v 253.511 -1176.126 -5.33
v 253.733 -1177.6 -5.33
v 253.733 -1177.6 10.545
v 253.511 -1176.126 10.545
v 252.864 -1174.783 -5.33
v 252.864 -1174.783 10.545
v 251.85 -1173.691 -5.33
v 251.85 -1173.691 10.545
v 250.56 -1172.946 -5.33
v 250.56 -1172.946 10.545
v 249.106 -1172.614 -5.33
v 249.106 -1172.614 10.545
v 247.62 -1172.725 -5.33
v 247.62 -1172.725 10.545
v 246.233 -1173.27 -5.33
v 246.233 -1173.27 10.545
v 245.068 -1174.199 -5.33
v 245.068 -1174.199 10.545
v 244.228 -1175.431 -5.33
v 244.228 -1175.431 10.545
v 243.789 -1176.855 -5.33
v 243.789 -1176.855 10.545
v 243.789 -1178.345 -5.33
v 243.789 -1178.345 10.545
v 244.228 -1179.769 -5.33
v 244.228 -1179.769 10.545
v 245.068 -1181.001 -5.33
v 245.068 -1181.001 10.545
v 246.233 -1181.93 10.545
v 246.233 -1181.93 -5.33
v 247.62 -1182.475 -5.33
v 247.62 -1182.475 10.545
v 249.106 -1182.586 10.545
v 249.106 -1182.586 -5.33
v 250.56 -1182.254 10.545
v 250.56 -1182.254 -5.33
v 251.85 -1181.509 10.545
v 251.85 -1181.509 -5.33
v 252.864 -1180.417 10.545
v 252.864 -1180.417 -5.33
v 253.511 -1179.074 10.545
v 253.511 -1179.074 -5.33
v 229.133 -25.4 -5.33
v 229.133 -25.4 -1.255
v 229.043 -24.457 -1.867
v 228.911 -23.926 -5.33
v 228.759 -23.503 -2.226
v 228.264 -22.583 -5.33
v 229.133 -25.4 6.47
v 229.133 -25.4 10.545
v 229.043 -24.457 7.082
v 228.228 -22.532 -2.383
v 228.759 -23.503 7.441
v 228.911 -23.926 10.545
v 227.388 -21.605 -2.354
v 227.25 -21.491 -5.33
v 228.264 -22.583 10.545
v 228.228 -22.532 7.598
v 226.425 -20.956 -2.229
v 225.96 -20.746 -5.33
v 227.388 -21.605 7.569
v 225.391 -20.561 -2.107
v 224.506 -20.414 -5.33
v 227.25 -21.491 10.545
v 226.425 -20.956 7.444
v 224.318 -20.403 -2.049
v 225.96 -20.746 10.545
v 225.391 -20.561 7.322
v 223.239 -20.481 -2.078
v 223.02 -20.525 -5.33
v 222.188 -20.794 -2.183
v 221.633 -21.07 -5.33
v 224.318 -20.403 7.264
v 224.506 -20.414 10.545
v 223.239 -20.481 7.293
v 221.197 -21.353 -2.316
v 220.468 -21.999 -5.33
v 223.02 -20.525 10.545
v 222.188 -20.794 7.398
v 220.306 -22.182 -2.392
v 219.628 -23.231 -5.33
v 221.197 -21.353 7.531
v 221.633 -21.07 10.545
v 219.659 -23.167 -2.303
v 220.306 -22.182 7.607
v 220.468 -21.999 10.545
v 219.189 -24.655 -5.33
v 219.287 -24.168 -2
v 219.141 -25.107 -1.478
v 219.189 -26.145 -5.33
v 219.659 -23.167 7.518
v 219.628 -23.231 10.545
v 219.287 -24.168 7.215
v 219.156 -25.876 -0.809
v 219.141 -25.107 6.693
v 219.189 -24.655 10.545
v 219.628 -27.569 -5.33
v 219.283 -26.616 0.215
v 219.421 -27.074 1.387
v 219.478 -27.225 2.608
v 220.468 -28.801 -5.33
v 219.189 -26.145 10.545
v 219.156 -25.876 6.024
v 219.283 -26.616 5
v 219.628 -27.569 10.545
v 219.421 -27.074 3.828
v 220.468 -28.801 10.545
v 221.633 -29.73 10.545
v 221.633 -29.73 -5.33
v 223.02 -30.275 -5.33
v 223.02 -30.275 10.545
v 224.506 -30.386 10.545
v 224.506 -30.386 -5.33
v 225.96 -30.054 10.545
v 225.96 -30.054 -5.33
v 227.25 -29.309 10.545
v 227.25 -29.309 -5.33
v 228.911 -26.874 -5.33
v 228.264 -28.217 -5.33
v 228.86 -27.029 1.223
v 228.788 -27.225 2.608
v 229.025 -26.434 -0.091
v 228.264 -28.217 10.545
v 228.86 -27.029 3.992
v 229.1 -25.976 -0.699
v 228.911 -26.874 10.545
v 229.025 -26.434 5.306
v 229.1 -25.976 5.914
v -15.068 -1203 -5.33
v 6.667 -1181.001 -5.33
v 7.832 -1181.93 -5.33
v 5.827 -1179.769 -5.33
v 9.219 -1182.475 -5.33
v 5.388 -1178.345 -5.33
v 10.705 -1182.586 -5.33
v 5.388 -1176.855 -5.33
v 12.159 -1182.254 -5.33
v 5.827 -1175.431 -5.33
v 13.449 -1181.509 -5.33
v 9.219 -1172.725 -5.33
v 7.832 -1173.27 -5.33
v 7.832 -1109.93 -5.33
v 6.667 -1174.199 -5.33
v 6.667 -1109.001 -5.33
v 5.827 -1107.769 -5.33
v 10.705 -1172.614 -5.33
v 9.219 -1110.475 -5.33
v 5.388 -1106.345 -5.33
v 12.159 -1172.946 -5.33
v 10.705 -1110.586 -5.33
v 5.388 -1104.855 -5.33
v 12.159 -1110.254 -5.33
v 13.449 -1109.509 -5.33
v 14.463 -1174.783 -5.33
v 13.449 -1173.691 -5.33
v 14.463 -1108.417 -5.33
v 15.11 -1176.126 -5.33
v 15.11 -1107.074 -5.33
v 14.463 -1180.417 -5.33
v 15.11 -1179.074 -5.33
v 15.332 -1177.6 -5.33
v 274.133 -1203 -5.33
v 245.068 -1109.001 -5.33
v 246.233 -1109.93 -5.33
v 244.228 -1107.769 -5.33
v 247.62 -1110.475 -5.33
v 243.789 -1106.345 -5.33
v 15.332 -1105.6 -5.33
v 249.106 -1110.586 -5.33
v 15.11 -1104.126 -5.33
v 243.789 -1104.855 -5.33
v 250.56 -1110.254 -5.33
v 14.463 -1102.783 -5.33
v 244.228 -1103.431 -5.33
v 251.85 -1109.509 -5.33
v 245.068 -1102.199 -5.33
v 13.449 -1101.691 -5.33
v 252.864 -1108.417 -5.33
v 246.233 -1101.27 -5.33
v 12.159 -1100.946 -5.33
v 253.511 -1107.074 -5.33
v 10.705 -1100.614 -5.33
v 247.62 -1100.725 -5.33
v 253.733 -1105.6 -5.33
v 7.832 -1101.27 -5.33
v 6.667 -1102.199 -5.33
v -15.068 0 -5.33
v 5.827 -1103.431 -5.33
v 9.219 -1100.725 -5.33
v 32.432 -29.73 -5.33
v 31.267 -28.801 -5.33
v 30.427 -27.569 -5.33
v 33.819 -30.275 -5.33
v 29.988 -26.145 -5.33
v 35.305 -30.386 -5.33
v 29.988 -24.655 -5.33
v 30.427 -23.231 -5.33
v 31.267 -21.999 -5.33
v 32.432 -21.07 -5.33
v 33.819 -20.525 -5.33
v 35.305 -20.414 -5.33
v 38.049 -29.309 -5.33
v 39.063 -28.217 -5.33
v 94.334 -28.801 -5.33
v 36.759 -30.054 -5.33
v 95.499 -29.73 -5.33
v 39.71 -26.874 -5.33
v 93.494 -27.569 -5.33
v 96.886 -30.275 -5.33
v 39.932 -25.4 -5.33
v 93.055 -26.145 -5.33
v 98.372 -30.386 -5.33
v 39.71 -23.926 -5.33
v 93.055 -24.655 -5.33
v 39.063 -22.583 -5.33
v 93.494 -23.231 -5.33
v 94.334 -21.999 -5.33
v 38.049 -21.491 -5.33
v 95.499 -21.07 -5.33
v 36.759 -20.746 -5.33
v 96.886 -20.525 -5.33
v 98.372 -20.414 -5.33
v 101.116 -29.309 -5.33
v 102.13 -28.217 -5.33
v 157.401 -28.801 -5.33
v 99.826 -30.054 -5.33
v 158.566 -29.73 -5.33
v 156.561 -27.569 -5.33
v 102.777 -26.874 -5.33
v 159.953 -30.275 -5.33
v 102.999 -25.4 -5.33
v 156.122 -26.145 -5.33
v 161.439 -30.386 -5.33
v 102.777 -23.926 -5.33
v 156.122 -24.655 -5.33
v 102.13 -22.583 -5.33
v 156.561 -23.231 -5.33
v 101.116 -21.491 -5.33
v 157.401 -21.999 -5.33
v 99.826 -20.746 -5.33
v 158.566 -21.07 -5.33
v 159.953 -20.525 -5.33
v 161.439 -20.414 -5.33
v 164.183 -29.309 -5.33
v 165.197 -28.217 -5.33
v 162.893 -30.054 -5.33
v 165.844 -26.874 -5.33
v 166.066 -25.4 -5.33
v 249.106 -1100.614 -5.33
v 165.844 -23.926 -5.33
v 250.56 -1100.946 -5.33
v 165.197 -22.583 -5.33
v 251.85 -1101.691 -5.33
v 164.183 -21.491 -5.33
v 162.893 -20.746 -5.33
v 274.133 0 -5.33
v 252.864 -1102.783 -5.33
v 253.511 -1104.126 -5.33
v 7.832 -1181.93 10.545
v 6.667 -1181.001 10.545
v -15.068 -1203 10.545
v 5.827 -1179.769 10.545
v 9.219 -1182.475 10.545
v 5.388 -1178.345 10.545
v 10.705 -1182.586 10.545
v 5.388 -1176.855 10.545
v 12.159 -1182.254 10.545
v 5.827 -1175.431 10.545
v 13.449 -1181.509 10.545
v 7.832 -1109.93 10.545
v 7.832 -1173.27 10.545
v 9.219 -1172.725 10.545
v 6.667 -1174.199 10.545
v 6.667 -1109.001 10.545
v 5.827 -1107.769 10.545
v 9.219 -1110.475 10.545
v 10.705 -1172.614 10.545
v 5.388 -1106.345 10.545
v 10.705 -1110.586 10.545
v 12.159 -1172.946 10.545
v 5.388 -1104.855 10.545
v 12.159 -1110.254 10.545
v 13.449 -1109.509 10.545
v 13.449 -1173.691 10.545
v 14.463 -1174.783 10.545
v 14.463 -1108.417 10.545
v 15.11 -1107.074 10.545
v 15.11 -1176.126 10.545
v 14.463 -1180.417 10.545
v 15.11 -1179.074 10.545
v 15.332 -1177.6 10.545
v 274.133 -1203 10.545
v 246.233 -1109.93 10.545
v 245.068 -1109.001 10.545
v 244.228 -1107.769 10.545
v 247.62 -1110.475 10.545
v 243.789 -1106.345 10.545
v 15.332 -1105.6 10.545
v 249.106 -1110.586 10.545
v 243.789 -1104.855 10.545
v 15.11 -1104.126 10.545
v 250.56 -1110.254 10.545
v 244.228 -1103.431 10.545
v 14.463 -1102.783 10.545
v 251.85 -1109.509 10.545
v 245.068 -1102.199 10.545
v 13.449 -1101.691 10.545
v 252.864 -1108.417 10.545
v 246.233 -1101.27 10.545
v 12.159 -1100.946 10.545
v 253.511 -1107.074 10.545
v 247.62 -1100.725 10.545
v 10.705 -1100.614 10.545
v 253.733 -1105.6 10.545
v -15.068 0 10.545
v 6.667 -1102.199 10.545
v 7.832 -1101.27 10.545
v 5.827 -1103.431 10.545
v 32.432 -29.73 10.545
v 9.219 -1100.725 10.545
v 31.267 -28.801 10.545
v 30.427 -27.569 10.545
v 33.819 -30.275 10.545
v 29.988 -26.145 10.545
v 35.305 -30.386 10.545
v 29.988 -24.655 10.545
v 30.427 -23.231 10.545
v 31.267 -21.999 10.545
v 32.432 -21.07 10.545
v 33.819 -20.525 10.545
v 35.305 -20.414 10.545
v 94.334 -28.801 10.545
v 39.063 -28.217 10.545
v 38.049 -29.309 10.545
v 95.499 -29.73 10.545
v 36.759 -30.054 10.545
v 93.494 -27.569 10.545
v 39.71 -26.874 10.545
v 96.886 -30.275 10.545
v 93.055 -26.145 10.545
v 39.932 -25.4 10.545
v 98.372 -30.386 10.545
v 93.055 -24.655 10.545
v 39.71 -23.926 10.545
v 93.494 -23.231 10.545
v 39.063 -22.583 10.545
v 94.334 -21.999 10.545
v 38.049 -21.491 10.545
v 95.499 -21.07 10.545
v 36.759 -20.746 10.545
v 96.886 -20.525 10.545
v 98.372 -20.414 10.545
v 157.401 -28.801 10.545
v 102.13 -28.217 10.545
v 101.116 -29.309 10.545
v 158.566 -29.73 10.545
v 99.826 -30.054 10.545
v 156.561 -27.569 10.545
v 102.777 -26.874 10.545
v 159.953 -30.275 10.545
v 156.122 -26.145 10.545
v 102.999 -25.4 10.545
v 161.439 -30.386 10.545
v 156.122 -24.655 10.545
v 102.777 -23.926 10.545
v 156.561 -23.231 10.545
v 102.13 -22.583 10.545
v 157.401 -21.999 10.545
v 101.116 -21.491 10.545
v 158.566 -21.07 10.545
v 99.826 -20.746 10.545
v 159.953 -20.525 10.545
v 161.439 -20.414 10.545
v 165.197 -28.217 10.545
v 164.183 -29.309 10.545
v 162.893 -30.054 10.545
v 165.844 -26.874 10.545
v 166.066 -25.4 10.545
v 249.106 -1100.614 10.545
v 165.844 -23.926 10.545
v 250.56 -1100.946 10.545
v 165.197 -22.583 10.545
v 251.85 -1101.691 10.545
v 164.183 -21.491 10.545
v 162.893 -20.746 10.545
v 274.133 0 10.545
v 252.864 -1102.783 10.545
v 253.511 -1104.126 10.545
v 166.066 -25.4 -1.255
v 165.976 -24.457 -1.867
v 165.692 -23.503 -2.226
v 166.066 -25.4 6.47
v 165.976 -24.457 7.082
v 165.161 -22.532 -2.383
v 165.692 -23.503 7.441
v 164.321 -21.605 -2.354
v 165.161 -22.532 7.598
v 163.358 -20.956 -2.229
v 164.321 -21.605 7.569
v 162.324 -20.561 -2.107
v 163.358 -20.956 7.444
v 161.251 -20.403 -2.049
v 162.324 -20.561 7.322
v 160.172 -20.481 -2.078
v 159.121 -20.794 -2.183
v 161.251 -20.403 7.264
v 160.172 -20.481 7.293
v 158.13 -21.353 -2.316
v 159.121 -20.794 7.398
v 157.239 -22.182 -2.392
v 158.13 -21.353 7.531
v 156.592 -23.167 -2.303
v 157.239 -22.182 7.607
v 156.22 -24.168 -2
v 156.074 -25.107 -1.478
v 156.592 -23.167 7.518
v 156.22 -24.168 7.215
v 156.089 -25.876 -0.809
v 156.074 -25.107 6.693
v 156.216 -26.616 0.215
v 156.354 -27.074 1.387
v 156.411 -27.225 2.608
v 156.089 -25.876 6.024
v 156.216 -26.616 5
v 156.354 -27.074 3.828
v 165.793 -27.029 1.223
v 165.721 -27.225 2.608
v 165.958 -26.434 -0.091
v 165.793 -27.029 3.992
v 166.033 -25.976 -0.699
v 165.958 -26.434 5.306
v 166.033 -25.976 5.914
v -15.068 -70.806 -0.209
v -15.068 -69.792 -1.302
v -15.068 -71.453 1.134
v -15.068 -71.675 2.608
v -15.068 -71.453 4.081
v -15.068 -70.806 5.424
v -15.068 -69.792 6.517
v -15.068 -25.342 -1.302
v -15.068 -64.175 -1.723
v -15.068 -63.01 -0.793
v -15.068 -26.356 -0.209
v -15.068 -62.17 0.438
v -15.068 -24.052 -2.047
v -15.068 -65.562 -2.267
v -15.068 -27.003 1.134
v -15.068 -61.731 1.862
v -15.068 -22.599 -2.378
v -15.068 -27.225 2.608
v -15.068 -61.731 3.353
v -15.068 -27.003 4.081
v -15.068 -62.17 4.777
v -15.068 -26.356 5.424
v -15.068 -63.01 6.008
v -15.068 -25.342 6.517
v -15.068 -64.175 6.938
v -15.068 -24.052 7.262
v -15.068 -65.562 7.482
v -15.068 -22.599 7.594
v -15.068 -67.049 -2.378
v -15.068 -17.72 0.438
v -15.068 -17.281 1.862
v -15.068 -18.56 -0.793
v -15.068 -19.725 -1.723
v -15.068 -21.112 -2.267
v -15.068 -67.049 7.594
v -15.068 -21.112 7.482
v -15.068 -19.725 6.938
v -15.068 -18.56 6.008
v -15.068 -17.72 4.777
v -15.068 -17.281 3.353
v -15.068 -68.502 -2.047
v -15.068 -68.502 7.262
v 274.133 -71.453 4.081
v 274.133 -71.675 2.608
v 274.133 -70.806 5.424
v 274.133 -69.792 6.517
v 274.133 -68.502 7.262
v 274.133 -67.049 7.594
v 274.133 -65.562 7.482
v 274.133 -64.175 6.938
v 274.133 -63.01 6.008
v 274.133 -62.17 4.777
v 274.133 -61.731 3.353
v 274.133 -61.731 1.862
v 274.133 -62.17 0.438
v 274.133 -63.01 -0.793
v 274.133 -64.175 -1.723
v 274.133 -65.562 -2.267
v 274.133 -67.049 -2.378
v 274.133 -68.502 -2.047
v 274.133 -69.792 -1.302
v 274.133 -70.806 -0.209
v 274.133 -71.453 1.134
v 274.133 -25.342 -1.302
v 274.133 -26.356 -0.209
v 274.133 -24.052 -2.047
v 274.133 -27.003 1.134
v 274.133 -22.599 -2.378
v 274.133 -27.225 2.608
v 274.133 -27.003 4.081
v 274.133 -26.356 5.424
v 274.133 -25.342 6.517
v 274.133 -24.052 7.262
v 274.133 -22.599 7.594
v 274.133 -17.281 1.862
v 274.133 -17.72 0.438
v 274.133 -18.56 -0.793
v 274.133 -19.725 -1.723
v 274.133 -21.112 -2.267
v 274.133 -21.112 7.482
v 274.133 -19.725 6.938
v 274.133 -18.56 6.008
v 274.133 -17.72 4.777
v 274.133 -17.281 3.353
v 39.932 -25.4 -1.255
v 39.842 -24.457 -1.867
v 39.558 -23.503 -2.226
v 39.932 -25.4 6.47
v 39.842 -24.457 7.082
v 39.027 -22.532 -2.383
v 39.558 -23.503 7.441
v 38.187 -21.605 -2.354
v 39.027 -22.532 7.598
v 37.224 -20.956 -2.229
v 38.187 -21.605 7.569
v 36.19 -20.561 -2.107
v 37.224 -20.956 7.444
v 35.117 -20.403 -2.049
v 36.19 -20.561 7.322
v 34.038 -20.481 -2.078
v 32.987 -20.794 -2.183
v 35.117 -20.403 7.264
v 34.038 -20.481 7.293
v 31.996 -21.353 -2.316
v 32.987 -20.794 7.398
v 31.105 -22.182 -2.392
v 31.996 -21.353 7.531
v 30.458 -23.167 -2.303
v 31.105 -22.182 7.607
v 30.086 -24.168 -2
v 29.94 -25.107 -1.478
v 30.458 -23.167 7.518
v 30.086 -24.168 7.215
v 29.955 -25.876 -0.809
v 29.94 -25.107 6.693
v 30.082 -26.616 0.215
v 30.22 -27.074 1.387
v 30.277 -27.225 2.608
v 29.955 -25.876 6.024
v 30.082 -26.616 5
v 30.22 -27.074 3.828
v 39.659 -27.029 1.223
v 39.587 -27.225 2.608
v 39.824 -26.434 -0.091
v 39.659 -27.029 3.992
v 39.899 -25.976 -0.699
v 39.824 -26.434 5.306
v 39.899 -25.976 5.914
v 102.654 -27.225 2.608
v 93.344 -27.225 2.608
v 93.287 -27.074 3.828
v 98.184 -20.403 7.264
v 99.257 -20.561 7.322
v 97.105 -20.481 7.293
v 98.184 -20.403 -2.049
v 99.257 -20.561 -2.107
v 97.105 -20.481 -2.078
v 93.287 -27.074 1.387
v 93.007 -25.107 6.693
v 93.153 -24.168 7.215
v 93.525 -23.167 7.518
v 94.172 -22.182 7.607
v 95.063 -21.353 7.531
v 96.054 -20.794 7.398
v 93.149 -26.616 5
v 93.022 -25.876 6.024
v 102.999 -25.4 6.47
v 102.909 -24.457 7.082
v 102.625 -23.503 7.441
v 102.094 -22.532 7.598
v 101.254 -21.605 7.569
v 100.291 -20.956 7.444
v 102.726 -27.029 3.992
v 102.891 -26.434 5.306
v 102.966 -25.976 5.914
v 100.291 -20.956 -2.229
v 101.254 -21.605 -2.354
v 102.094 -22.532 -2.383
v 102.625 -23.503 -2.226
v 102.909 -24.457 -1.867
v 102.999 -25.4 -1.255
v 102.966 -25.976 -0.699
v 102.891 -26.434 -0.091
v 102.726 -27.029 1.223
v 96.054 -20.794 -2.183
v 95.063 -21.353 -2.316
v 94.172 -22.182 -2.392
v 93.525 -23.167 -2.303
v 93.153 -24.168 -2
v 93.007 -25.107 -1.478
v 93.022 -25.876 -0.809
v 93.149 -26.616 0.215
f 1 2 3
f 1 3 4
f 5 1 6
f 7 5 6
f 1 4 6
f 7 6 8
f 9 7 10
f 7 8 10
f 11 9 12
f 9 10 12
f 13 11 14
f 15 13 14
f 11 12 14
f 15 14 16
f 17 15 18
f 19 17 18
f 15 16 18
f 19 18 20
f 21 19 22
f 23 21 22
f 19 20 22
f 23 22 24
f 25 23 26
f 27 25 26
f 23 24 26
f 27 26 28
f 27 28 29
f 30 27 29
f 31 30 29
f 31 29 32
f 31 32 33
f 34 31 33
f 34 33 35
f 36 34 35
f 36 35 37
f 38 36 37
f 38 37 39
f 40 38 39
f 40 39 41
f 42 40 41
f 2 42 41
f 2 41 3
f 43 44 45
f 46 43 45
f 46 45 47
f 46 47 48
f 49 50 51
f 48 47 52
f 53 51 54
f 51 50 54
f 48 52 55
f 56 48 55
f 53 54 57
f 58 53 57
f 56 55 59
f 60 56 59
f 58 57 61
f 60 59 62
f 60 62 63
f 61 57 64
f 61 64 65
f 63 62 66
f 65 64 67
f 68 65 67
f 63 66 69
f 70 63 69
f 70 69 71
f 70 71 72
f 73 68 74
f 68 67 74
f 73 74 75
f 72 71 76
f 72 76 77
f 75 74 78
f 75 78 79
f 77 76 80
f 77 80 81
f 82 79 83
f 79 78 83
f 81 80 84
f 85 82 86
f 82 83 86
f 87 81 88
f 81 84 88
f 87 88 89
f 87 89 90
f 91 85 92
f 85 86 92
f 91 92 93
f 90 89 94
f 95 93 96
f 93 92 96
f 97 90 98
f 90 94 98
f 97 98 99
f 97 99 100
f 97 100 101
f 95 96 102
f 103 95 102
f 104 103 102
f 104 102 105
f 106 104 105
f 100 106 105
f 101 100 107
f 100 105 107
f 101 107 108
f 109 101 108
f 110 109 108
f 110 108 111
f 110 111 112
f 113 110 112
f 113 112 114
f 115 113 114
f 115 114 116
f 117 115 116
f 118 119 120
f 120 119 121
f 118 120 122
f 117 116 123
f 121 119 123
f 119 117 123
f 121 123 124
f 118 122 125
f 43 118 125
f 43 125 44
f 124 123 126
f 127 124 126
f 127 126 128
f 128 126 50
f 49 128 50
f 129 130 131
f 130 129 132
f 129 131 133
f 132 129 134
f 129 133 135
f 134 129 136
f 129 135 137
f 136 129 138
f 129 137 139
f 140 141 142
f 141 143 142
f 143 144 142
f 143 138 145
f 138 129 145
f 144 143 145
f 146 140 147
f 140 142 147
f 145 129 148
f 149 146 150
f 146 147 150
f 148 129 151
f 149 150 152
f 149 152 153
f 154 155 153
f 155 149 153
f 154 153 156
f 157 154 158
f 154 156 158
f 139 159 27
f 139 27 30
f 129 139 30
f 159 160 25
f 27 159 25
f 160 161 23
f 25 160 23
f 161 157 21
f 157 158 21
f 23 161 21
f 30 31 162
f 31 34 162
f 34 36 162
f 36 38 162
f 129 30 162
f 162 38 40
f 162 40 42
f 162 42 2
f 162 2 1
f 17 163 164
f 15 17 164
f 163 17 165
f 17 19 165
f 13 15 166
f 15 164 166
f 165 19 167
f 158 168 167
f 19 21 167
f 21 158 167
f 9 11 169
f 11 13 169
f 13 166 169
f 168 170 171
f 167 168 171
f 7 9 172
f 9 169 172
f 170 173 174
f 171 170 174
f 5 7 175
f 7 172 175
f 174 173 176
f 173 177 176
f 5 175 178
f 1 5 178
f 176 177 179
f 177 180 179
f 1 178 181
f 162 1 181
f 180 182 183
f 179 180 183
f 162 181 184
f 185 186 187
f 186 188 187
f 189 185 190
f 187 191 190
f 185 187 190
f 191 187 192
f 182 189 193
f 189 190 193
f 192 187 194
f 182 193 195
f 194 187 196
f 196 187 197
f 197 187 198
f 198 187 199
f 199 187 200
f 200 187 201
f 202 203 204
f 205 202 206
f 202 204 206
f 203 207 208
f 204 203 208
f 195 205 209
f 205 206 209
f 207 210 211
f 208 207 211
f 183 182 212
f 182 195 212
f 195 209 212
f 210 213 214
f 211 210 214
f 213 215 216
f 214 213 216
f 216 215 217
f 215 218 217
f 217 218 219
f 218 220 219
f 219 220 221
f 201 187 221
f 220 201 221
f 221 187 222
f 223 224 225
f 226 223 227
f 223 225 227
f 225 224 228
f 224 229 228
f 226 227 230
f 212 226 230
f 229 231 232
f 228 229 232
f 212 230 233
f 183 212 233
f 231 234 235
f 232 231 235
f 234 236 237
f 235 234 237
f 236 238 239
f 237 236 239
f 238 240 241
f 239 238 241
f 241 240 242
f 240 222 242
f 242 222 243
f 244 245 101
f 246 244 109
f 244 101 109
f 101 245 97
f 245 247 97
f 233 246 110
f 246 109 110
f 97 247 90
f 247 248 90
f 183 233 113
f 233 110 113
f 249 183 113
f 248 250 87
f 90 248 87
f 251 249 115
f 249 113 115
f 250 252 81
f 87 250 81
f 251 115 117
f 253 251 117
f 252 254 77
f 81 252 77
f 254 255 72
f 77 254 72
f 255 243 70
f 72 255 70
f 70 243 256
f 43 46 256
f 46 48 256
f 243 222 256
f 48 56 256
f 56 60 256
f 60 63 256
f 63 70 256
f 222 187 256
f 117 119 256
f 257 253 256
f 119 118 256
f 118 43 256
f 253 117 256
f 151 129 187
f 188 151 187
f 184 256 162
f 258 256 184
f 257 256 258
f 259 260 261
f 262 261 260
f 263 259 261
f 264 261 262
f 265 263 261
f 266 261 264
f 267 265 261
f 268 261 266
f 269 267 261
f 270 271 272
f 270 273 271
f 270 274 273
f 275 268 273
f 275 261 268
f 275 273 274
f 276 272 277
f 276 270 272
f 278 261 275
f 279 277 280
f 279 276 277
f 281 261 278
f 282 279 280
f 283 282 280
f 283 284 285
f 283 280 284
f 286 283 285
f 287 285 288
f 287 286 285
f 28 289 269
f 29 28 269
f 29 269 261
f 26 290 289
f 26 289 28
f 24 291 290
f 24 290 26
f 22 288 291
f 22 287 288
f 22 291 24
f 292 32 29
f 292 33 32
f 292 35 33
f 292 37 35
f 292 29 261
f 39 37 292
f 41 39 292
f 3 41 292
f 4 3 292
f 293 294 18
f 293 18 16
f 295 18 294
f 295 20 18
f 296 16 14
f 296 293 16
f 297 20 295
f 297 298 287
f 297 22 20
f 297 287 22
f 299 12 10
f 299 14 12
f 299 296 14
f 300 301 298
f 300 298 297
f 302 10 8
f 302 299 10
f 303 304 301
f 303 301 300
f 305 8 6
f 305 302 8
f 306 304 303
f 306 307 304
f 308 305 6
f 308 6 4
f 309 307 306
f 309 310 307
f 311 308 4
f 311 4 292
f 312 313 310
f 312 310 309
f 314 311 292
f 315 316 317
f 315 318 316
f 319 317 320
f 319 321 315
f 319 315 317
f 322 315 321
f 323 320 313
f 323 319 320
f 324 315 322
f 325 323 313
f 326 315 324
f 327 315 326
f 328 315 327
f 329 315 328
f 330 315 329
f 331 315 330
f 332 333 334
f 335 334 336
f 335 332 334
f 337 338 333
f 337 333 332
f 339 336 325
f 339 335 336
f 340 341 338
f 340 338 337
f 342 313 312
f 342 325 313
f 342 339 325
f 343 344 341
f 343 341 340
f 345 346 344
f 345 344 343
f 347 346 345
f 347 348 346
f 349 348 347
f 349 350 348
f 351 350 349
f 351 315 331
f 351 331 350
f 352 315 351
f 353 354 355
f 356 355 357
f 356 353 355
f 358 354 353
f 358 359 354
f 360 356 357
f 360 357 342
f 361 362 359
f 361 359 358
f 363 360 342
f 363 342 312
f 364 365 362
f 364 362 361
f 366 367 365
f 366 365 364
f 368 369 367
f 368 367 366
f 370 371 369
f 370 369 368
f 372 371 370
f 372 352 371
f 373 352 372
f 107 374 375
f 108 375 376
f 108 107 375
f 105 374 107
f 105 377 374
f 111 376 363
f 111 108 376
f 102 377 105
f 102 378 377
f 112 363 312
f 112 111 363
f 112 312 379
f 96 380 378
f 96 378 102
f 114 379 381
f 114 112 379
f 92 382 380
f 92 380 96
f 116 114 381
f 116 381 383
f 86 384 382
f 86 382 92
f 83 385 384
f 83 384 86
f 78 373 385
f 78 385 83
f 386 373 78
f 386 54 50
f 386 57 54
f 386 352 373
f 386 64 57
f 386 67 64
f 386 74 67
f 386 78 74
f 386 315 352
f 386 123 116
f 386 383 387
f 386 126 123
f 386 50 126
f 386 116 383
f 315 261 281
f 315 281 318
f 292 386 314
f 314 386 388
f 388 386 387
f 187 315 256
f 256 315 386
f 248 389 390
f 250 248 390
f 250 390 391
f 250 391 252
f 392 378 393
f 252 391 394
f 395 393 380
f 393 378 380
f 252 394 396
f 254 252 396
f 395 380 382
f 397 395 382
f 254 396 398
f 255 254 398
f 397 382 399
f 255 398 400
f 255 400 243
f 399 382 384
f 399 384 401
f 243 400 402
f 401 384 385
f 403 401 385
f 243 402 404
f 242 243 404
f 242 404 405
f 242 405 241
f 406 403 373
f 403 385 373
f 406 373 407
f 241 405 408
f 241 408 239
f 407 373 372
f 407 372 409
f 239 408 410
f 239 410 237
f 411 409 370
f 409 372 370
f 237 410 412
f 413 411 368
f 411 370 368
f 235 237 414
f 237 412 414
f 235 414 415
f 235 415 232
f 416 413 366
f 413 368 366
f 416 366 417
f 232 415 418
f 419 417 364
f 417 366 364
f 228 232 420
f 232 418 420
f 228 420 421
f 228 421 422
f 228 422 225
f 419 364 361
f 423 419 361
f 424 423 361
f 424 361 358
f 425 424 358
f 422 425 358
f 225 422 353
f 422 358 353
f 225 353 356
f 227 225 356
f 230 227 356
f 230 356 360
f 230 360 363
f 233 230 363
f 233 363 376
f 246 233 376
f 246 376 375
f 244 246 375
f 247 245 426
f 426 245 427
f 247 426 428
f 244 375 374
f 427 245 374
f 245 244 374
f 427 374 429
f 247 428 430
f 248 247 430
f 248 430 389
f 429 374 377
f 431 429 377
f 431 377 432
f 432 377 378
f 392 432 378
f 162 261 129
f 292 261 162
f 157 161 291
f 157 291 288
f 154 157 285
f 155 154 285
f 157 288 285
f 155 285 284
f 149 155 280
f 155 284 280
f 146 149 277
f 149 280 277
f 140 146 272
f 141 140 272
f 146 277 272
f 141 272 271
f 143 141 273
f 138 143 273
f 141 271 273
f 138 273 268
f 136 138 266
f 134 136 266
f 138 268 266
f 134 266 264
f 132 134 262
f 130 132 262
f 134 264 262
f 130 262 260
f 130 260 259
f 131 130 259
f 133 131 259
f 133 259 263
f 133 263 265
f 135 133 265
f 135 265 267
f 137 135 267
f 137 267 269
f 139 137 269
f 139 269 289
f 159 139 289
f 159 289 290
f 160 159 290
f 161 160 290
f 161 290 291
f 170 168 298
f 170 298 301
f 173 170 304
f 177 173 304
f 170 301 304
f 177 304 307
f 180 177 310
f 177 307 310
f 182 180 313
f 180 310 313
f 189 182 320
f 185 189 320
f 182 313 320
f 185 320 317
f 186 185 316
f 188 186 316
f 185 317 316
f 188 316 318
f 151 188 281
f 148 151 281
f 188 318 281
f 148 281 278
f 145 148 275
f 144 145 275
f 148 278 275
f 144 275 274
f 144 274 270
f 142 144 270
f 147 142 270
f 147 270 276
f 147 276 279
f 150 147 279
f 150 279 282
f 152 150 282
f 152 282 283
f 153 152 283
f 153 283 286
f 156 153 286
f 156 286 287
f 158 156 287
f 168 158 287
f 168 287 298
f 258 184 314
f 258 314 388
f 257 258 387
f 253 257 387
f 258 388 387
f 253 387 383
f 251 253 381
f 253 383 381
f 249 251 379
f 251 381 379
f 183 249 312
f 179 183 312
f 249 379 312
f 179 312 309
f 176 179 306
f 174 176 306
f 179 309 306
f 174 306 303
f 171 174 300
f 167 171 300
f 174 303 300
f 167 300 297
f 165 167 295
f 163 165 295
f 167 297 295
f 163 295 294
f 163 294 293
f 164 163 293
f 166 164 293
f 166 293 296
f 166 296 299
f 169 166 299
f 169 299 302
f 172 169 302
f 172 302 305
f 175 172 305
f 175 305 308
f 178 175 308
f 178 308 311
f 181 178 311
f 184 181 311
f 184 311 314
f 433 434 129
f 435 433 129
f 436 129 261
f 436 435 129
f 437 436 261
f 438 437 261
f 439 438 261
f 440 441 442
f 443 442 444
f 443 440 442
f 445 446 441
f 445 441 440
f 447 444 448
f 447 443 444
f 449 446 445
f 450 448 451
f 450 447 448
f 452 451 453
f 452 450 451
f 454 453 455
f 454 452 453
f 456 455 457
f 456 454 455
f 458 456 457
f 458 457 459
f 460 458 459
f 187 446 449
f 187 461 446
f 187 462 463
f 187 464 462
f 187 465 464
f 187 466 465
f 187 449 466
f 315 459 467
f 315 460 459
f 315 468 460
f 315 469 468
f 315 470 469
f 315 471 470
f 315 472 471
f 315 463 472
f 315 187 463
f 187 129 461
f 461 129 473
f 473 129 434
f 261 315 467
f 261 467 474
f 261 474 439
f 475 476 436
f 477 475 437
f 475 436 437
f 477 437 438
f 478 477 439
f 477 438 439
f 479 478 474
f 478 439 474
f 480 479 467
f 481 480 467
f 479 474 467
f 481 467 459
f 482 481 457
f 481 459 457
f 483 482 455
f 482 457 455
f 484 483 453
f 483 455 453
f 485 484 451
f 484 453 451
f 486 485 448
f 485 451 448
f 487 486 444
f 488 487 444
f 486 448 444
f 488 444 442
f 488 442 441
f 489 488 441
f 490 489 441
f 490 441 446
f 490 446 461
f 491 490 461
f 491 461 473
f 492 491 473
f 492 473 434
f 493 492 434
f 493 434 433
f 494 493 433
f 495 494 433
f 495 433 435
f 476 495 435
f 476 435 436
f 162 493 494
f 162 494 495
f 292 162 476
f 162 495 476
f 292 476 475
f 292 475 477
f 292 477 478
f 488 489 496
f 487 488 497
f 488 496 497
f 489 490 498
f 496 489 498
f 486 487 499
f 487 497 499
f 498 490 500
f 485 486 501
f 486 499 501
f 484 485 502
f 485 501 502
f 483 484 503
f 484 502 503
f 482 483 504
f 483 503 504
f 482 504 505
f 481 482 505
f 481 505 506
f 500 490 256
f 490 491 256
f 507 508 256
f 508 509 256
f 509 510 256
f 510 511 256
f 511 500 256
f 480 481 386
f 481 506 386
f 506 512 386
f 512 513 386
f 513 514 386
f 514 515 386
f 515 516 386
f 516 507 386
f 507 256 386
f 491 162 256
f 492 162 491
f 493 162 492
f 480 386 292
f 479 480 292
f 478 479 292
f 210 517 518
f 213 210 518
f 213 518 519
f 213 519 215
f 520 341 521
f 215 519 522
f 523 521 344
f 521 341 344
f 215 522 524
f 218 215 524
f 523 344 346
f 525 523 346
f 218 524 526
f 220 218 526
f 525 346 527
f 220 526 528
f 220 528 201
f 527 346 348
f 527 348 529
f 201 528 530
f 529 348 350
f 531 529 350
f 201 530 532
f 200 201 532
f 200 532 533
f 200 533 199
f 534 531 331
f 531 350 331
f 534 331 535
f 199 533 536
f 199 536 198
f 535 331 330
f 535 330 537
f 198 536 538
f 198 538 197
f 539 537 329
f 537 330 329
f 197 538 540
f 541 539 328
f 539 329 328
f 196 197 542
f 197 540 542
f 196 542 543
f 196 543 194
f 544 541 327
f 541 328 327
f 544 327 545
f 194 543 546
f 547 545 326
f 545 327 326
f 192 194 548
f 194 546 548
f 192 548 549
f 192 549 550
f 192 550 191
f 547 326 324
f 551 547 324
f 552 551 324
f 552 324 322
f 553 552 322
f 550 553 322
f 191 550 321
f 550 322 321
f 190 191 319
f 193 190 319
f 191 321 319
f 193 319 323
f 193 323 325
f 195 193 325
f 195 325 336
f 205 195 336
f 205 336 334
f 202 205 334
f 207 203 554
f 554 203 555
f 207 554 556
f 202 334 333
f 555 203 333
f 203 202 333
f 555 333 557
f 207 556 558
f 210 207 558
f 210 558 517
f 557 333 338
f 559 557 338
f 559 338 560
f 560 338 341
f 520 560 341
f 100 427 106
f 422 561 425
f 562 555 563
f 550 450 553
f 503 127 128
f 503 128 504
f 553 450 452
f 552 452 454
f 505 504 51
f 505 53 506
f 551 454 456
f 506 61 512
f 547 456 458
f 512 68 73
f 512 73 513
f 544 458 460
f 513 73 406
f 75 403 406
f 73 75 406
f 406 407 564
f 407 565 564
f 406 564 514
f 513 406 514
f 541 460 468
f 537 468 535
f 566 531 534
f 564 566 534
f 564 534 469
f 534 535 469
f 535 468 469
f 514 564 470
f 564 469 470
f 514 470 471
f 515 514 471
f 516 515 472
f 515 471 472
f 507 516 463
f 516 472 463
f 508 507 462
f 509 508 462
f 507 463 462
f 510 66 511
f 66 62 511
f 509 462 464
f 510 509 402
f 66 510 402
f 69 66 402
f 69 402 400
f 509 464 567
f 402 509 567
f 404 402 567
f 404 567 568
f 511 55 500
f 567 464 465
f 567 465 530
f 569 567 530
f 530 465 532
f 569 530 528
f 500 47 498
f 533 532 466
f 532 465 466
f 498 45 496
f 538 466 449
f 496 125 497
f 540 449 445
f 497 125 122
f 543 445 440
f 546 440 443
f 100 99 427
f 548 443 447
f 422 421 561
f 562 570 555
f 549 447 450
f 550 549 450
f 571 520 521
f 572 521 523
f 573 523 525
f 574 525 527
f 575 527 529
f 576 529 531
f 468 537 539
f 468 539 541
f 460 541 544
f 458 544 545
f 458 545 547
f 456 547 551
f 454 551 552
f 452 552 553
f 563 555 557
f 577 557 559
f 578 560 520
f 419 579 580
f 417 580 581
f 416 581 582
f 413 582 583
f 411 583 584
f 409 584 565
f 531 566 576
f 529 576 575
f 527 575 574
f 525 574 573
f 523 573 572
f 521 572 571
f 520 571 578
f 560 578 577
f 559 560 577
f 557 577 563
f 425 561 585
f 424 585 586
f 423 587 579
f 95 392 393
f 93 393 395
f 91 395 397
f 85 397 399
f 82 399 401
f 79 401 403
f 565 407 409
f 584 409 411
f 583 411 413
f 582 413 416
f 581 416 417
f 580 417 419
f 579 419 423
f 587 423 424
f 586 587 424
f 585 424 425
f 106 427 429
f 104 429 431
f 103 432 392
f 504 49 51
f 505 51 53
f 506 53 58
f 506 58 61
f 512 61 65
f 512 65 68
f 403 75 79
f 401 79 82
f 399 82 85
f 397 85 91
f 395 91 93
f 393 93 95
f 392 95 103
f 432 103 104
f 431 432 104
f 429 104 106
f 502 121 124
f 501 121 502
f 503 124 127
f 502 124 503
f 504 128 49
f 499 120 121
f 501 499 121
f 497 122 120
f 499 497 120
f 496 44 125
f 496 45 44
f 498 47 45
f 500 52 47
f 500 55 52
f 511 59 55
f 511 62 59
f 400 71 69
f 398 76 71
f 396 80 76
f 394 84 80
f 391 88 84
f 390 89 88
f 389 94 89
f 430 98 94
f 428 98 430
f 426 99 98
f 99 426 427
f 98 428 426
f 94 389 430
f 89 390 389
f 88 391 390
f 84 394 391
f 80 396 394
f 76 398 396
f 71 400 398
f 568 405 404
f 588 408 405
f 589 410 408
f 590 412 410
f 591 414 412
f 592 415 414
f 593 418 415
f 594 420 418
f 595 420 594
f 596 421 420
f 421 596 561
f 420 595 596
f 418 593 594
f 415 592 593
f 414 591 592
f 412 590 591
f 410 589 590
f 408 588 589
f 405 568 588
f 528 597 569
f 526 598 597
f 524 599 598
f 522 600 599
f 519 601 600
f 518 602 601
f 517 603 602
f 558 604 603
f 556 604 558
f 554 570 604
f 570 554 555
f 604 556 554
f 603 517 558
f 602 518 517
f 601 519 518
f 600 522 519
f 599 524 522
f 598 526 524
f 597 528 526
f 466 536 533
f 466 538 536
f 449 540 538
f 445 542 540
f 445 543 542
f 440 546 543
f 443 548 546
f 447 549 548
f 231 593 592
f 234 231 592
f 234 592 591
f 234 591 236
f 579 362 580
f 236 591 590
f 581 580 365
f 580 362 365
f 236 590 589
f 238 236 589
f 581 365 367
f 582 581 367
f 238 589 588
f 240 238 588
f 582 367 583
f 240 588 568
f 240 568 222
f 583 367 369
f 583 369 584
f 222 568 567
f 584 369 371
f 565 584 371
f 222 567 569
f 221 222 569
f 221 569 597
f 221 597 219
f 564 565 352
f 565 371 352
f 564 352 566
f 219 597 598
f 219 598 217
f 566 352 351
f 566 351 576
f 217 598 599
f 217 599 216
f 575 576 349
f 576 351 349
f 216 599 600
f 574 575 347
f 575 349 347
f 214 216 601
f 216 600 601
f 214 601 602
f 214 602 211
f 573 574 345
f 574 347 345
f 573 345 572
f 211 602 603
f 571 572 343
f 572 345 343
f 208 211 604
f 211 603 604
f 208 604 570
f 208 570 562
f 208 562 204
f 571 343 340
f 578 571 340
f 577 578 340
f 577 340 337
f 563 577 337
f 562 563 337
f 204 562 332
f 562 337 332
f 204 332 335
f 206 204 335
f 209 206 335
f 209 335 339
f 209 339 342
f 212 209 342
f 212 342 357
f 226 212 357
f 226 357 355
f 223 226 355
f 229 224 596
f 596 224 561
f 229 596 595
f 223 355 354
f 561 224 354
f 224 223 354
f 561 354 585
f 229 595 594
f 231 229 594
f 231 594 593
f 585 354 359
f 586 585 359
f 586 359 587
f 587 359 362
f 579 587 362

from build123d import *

# Parameters (mm, degrees)
F0_W     = 289.201
F0_H     = 15.875
F1_DEPTH = 1203
F2_R     = 5
F3_DEPTH = 15.876
F4_R     = 5
F5_DEPTH = 289.202


with BuildPart() as f1:
    # F0 (on Front) → F1 (new body)
    with BuildSketch(Plane.XZ):
        with Locations((129.532325, 2.607536)):
            Rectangle(F0_W, F0_H)
    extrude(amount=F1_DEPTH)

    # F2 (on face) → F3 (cut, through all)
    with BuildSketch(Plane.XY.offset(10.545036)):
        with Locations((10.331825, -1177.6)):
            Circle(F2_R)
        with Locations((10.331825, -1105.6)):
            Circle(F2_R)
        with Locations((248.732825, -1105.6)):
            Circle(F2_R)
        with Locations((248.732825, -1177.6)):
            Circle(F2_R)
        with Locations((34.931825, -25.4)):
            Circle(F2_R)
        with Locations((97.998825, -25.4)):
            Circle(F2_R)
        with Locations((161.065825, -25.4)):
            Circle(F2_R)
        with Locations((224.132825, -25.4)):
            Circle(F2_R)
    extrude(amount=-F3_DEPTH, mode=Mode.SUBTRACT)

    # F4 (on face) → F5 (cut, through all)
    with BuildSketch(Plane(origin=(-15.068175, 0, 0), x_dir=(0, -1, 0), z_dir=(-1, 0, 0))):
        with Locations((22.225, 2.607536)):
            Circle(F4_R)
        with Locations((66.675, 2.607536)):
            Circle(F4_R)
    extrude(amount=-F5_DEPTH, mode=Mode.SUBTRACT)


solid = f1.part
